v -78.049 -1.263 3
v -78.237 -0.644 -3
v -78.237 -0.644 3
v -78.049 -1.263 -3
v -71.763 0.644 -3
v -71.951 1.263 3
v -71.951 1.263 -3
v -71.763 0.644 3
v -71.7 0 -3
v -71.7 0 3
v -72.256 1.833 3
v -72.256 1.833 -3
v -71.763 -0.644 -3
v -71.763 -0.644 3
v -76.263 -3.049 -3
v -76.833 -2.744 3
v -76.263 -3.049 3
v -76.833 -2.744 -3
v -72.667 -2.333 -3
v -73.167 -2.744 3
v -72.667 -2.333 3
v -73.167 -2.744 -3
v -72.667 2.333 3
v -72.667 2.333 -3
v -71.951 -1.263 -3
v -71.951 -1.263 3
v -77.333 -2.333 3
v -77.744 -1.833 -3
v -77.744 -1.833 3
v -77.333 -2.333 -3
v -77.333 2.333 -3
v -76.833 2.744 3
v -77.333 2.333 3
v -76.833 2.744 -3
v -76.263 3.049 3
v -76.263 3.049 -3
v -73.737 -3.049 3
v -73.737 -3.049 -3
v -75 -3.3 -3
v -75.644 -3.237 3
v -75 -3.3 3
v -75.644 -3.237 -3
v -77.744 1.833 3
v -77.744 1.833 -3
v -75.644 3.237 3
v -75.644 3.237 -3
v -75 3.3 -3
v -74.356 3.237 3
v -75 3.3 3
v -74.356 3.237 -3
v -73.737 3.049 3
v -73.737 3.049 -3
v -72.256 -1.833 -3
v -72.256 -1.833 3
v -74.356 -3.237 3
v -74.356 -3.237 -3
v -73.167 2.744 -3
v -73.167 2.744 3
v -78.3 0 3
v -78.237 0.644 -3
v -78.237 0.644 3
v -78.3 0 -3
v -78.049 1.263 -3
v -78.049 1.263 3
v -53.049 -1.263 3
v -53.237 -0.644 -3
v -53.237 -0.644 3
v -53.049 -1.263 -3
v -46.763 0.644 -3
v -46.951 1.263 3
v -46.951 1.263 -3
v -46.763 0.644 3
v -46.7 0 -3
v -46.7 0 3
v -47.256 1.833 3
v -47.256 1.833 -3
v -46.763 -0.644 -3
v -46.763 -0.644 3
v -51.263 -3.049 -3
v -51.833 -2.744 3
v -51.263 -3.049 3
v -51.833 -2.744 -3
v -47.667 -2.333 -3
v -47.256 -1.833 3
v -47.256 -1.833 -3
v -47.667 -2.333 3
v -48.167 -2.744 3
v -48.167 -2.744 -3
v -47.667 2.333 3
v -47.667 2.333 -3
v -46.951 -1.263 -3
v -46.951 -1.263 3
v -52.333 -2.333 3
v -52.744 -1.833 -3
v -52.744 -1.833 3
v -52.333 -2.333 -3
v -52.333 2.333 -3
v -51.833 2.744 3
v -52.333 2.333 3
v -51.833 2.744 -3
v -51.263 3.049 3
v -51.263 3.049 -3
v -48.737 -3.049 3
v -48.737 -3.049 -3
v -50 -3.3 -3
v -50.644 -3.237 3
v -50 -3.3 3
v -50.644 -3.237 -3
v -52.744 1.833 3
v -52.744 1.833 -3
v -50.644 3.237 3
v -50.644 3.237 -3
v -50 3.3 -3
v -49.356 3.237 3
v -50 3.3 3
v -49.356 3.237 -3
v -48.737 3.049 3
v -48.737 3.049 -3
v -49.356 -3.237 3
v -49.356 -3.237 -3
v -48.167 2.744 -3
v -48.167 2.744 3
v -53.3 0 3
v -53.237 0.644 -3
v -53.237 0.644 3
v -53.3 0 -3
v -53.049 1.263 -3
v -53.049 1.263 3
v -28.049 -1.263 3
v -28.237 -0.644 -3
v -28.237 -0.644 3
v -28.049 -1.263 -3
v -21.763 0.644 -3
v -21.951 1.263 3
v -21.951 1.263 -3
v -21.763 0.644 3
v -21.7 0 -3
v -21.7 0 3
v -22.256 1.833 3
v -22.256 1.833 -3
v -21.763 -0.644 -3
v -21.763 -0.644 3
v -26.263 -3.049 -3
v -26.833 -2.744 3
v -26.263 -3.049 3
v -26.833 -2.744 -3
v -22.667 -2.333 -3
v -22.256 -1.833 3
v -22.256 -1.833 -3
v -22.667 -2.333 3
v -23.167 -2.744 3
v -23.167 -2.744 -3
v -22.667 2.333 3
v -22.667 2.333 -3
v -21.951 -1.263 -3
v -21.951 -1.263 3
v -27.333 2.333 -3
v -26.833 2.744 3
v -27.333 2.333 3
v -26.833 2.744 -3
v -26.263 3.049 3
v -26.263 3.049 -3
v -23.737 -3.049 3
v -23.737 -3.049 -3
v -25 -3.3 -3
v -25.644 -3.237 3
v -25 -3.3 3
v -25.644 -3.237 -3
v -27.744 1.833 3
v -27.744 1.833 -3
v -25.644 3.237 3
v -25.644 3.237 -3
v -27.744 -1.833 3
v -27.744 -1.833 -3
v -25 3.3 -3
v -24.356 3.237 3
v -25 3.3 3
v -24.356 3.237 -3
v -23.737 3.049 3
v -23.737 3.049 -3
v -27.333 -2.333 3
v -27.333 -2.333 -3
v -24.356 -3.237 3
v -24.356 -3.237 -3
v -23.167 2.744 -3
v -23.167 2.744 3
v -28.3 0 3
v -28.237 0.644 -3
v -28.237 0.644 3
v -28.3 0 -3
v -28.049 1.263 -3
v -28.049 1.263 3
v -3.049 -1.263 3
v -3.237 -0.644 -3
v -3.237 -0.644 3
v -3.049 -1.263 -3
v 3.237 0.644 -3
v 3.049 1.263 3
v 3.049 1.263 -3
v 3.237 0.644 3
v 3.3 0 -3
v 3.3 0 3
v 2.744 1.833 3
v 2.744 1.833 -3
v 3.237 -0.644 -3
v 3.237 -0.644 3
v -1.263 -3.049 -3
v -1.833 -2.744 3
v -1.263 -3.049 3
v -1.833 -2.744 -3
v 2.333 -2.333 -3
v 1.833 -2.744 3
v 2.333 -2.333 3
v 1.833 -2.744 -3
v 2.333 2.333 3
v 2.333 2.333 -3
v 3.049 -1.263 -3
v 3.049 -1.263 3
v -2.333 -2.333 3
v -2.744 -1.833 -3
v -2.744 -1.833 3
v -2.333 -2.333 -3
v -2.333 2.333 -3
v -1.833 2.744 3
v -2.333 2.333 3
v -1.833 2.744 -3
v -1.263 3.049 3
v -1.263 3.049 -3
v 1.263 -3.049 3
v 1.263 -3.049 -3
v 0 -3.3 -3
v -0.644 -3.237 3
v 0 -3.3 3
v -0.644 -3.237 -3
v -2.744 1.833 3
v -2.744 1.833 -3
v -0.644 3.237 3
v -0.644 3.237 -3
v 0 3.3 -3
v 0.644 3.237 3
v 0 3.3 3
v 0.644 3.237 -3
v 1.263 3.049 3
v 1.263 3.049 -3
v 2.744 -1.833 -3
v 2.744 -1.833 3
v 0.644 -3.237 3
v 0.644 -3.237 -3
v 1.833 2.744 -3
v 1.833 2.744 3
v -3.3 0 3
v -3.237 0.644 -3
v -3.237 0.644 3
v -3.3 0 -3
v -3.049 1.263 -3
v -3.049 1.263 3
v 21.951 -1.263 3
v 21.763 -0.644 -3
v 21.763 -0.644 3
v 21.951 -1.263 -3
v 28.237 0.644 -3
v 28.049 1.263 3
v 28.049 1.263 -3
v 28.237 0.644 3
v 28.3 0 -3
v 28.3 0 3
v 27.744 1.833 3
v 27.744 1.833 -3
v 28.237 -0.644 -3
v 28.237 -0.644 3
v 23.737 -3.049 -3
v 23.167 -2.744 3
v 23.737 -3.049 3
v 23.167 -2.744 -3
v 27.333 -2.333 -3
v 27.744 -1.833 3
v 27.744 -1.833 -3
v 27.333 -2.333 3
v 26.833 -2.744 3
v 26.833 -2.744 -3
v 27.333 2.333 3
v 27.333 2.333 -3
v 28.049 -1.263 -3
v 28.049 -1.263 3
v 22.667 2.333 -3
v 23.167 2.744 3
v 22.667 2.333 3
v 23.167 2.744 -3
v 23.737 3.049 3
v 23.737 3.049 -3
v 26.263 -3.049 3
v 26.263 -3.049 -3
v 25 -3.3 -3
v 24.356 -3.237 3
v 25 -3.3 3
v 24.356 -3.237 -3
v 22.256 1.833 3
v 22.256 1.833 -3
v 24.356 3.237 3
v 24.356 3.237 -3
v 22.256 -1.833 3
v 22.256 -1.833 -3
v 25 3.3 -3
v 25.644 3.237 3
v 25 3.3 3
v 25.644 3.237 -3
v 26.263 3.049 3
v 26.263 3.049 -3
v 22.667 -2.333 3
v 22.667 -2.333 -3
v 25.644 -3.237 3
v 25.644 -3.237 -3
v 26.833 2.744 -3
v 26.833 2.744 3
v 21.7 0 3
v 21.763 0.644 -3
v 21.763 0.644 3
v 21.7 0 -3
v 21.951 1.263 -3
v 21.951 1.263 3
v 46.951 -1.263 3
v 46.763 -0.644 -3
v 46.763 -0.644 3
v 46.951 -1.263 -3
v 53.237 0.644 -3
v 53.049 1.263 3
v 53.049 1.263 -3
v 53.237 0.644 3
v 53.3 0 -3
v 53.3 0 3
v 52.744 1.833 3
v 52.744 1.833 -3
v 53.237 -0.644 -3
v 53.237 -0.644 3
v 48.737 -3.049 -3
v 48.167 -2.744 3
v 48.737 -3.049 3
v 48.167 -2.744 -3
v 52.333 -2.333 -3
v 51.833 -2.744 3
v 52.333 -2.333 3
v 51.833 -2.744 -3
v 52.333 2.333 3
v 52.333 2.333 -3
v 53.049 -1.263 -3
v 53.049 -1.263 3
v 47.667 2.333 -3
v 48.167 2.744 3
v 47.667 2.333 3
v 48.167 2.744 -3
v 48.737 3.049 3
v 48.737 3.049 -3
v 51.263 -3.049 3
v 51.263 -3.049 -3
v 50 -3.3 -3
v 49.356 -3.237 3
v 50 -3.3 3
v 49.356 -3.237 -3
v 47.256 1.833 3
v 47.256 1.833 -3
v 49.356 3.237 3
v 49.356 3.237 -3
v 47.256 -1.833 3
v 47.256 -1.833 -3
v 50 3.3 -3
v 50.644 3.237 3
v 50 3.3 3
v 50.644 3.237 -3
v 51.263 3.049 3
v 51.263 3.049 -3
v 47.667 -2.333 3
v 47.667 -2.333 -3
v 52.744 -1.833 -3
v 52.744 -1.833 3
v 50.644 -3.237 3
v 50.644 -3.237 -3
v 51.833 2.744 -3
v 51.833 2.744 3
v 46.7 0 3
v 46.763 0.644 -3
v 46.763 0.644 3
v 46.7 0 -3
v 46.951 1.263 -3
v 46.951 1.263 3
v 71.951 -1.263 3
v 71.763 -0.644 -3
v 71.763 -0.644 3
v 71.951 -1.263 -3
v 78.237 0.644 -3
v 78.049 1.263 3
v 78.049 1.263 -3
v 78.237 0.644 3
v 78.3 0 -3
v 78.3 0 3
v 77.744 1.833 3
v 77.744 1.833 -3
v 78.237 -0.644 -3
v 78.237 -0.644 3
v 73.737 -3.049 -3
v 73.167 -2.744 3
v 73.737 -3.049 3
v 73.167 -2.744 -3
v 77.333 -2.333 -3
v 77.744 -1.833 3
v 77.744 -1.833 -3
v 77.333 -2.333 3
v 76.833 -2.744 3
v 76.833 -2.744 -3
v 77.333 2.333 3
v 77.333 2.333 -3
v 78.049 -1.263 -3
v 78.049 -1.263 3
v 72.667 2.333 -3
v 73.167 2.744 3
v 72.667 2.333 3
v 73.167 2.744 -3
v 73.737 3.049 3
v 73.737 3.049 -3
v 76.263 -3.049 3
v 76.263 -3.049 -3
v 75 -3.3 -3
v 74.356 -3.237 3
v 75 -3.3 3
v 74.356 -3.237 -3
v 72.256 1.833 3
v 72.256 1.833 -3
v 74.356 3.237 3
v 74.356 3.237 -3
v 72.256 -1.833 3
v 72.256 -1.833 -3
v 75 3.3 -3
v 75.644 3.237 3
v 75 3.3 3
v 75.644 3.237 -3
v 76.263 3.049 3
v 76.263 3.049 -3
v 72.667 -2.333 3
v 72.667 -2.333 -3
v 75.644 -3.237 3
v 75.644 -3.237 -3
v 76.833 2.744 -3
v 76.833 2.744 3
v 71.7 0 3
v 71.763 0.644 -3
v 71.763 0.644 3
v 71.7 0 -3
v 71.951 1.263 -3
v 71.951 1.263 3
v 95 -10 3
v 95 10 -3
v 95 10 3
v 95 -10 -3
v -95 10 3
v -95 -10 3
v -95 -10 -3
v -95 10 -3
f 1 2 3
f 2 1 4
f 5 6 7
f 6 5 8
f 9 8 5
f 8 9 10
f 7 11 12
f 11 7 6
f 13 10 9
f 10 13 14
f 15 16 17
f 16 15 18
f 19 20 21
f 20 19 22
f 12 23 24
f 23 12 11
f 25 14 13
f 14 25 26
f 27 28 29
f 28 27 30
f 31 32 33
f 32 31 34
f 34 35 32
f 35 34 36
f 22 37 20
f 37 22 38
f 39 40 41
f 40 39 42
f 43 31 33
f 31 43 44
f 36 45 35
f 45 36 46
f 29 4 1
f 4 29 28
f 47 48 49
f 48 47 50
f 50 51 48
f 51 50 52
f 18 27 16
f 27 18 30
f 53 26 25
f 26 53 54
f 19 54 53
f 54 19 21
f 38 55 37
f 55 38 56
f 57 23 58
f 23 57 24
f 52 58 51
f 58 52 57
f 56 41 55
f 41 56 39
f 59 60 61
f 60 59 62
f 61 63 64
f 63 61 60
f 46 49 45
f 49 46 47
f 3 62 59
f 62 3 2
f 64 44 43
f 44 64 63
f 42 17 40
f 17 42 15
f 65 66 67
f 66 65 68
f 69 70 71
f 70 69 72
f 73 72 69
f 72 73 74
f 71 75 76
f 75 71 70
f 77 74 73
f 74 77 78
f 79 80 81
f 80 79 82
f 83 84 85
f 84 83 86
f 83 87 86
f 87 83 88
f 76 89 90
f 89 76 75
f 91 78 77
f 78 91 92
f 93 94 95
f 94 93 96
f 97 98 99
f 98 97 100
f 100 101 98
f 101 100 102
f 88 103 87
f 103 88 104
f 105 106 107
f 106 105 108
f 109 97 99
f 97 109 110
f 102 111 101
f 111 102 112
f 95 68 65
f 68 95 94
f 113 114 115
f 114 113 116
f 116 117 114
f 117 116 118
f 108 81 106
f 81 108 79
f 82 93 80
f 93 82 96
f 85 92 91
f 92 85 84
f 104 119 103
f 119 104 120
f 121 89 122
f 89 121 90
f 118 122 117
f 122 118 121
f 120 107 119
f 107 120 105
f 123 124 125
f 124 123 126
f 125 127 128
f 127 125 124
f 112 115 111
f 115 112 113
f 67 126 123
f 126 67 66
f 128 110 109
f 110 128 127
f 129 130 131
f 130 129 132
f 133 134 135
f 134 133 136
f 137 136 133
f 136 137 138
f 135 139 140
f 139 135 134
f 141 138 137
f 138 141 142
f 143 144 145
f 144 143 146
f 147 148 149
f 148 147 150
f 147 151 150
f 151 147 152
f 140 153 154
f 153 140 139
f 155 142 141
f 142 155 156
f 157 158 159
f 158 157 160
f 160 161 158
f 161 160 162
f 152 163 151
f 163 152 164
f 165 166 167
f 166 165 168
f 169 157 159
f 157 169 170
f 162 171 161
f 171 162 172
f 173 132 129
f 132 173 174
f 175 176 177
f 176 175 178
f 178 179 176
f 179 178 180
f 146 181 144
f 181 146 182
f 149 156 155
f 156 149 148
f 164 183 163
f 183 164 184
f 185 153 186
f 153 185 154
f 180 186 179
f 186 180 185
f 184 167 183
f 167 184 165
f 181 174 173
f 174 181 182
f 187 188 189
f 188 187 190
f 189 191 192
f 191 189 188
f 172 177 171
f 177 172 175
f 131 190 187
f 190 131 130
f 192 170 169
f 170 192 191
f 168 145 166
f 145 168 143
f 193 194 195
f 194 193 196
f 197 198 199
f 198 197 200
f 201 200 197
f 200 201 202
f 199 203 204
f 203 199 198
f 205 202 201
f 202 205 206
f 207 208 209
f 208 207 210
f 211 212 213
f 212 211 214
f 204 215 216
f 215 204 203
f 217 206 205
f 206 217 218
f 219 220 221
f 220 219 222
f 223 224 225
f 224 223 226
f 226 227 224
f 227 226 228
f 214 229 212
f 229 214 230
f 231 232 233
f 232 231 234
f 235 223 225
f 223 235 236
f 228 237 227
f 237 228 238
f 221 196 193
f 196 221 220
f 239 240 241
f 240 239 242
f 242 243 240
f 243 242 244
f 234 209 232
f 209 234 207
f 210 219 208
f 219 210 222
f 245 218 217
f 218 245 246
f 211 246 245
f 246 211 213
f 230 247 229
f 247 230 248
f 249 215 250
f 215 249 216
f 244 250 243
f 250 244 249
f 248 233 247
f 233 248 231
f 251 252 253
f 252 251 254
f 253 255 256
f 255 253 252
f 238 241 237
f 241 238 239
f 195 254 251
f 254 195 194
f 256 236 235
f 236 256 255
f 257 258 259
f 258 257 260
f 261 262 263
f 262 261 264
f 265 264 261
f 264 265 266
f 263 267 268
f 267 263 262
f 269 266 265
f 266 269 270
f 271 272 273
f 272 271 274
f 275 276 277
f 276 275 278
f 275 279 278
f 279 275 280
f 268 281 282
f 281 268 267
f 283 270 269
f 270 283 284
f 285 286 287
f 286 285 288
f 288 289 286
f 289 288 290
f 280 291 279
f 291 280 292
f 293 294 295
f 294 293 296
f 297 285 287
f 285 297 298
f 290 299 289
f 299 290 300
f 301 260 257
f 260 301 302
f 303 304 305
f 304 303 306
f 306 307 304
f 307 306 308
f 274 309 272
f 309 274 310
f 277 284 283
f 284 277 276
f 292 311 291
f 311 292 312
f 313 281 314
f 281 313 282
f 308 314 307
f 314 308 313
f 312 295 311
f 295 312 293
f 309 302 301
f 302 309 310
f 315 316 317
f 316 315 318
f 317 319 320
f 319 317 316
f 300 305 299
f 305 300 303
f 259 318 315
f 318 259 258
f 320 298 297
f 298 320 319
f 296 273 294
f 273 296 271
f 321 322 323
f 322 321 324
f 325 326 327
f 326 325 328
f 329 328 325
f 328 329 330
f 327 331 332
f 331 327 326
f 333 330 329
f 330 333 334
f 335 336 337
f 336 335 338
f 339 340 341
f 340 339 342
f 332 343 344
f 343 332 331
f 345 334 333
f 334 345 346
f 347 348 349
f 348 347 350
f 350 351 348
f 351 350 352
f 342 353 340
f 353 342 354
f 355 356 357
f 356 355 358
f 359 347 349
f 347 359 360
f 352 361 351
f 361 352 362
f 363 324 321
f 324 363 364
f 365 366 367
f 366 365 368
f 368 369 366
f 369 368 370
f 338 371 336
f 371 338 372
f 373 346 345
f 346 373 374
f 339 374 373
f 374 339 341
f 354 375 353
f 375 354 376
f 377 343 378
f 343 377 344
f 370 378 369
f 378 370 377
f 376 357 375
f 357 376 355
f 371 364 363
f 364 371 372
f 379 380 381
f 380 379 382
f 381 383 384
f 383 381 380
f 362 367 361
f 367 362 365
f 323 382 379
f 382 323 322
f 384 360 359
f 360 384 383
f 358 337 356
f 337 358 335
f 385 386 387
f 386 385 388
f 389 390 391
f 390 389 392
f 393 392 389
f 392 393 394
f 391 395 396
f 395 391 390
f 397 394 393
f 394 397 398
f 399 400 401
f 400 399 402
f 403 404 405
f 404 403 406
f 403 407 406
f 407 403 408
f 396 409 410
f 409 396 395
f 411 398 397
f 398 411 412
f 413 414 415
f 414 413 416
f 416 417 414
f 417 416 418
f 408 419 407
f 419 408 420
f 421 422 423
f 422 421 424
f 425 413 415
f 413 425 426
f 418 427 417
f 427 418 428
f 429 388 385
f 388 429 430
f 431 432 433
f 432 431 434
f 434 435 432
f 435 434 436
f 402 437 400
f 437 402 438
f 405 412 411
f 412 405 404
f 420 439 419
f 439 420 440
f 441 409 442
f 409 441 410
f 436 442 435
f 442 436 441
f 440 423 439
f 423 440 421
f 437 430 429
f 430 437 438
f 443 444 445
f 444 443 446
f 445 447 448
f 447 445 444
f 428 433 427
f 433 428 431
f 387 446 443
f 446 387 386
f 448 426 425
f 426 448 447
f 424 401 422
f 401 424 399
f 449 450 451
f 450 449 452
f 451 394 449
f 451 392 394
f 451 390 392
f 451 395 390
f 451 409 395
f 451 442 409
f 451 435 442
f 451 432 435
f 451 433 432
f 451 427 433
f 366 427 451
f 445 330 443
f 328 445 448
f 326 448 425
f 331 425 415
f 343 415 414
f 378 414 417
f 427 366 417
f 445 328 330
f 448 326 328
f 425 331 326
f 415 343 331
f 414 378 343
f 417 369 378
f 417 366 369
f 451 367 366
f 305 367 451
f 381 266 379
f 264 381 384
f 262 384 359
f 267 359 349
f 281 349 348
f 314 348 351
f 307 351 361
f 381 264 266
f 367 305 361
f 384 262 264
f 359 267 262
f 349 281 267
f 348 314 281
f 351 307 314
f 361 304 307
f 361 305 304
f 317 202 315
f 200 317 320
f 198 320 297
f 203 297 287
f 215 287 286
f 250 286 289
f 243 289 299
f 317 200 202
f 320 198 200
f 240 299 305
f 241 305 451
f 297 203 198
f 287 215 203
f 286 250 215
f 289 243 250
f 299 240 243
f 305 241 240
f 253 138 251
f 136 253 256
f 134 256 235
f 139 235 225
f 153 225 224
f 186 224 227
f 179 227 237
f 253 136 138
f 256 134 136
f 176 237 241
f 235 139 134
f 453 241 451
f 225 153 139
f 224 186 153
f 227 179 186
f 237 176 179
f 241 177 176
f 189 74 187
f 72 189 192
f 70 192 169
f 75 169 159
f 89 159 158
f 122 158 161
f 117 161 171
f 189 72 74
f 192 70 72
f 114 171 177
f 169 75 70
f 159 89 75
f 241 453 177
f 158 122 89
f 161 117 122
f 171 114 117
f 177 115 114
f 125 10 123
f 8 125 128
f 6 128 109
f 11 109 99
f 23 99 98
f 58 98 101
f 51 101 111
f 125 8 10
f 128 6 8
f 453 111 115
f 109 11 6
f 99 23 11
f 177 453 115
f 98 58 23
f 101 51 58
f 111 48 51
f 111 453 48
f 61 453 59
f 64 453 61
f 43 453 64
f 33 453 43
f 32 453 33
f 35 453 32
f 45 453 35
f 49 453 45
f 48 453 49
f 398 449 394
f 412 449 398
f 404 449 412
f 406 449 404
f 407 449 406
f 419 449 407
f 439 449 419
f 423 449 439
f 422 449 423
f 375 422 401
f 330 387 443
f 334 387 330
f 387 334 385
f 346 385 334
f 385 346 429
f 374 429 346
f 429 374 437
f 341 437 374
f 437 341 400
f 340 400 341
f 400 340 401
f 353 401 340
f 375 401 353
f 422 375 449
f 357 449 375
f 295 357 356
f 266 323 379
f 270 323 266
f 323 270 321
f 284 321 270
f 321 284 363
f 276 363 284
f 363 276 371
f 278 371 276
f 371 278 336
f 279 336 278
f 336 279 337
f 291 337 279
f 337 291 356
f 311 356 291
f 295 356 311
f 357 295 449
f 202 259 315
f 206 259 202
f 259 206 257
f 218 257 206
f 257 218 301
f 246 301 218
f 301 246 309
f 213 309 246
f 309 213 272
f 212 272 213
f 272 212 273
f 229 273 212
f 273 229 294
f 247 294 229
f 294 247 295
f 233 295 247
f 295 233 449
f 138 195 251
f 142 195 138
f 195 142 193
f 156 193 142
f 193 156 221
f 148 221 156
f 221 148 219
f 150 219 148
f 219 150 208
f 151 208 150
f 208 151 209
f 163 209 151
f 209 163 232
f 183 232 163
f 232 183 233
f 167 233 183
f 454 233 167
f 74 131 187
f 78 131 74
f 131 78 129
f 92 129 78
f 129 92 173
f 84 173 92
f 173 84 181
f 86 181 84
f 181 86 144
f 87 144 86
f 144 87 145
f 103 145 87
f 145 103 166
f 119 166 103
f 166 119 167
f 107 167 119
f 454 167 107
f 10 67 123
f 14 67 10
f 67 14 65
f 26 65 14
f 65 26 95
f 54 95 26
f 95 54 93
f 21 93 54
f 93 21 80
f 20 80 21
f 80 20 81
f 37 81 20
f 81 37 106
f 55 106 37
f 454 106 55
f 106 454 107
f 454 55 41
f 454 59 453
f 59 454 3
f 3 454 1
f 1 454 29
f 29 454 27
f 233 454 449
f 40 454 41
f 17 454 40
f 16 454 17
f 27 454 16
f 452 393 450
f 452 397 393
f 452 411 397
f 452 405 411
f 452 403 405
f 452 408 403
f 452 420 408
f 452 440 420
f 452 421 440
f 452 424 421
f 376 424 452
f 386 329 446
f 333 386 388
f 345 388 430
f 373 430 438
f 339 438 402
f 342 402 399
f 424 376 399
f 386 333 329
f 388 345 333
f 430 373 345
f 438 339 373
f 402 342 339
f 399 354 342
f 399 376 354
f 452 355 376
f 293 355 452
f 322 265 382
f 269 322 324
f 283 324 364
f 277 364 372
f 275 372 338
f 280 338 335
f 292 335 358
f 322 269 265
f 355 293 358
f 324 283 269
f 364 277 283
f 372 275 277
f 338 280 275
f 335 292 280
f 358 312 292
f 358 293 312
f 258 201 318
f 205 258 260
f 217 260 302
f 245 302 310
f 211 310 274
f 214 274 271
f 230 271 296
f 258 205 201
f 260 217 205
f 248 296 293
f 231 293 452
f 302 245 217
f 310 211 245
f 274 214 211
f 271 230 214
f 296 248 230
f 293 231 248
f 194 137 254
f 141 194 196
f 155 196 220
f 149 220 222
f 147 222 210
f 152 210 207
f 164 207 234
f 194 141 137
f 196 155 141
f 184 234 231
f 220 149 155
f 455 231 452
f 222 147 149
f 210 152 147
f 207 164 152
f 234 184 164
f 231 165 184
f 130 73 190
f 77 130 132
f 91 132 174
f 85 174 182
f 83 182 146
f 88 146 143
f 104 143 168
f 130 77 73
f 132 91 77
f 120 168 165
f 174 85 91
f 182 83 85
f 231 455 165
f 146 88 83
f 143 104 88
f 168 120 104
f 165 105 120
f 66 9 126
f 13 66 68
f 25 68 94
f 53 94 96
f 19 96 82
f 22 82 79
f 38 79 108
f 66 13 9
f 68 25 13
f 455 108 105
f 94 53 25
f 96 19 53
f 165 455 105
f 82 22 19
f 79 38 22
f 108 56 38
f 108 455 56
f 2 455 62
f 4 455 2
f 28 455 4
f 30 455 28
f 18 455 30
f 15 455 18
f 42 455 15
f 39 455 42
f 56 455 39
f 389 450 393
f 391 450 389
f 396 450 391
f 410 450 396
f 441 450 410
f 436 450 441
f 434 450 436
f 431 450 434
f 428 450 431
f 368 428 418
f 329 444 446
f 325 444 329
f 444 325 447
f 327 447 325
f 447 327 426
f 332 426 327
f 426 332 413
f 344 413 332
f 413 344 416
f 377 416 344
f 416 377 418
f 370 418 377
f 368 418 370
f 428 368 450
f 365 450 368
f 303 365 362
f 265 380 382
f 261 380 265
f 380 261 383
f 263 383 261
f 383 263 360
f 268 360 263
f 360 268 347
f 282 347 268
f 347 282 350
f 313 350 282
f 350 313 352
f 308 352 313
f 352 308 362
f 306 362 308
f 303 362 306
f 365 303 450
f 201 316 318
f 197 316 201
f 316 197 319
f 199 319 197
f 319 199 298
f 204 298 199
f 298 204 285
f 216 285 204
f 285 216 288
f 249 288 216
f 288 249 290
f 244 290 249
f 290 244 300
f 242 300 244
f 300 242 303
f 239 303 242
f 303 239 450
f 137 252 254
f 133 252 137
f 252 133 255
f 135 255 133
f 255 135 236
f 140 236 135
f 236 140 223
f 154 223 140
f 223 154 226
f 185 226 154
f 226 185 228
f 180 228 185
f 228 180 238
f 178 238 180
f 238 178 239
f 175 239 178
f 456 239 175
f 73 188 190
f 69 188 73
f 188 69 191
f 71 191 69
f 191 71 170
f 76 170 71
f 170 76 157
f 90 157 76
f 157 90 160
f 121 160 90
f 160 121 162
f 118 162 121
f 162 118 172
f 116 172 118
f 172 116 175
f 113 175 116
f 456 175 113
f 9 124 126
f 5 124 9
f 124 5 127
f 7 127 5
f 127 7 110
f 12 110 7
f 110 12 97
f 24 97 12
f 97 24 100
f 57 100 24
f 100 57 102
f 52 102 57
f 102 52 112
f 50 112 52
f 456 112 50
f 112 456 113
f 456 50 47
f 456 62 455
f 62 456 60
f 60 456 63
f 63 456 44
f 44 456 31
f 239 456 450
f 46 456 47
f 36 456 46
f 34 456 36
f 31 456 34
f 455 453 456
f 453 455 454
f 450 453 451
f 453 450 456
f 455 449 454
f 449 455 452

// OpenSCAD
$fn = 32;

// ----------------------------------------------------------------------
// Hole bar, 7 x Ø6.6
// row layout, 20 mm edge offset
// ----------------------------------------------------------------------

// --- parameters (mm) ---
bar_w = 20;    // bar width (Y)
bar_t = 6;     // bar thickness (Z)
holes = 7;     // holes per row
hole_d = 6.6;  // hole diameter
edge = 20;     // offset from the bar end to the first hole
pitch = 25;    // pitch between neighbouring holes

// --- derived feature positions (mm) ---
span = (holes - 1) * pitch;   // = 150   distance between the end holes
bar_l = span + 2 * edge;      // = 190   overall bar length
start_x = -bar_l / 2 + edge;  // = -75   X of the first hole
feature_centers = [
  [start_x + 0 * pitch, 0],
  [start_x + 1 * pitch, 0],
  [start_x + 2 * pitch, 0],
  [start_x + 3 * pitch, 0],
  [start_x + 4 * pitch, 0],
  [start_x + 5 * pitch, 0],
  [start_x + 6 * pitch, 0]
];   // hole centres of the first row

// bar with one row of holes, drilled from feature_centers
difference() {
  translate([-bar_l / 2, -bar_w / 2, -bar_t / 2]) cube([bar_l, bar_w, bar_t]);
  for (centre = feature_centers)
    translate([centre[0], centre[1], 0])
      cylinder(d = hole_d, h = bar_t + 2, center = true);
}
